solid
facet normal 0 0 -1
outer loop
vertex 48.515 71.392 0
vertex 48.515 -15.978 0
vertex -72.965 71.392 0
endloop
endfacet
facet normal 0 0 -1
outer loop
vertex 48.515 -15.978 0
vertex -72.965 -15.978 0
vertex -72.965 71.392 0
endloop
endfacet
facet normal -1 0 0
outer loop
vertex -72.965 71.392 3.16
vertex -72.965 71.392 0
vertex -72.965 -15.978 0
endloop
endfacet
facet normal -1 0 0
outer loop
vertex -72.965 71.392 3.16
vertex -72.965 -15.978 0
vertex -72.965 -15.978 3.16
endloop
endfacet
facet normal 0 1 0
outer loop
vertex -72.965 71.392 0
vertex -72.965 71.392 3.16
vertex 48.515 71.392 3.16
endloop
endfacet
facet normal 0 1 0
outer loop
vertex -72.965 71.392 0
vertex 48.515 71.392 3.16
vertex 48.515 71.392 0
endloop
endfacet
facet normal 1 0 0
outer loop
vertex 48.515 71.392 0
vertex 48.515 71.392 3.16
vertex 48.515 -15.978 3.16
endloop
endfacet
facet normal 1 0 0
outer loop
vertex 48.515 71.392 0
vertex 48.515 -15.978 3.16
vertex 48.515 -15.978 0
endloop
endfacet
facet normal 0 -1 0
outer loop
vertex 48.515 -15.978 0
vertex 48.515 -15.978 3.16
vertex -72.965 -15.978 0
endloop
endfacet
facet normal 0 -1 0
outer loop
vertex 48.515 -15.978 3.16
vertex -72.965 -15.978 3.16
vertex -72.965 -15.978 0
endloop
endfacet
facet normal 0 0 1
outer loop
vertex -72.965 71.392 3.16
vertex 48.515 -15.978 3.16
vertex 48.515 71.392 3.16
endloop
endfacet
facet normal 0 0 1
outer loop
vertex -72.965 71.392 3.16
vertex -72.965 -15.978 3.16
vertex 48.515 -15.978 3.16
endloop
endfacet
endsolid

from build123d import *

# Parameters (mm, degrees)
SKETCH2_W           = 77.34
SKETCH2_H           = 87.37
BOSS_EXTRUDE1_DEPTH = 3.16
SKETCH_3_W          = 3.16
SKETCH_3_H          = 87.37
EXTRUDE_3_DEPTH     = 80
SKETCH_4_W          = 3.16
SKETCH_4_H          = 87.37
EXTRUDE_4_DEPTH     = 60
SKETCH_5_W          = 3.16
SKETCH_5_H          = 87.37
EXTRUDE_5_DEPTH     = 113
SKETCH_6_W          = 3.16
SKETCH_6_H          = 87.37
CUT_EXTRUDE_1_DEPTH = 17.86
SKETCH_8_R          = 12.75
CUT_EXTRUDE_2_DEPTH = 10
SKETCH_9_W          = 3.16
SKETCH_9_H          = 87.37
CUT_EXTRUDE_3_DEPTH = 171
SKETCH_10_W         = 3.16
SKETCH_10_H         = 87.37
CUT_EXTRUDE_4_DEPTH = 60
SKETCH_1_W          = 3.16
SKETCH_1_H          = 87.37
EXTRUDE_6_DEPTH     = 20
SKETCH_11_W         = 3.16
SKETCH_11_H         = 87.37
EXTRUDE_7_DEPTH     = 20


with BuildPart() as part:
    # Sketch2 → Boss-Extrude1 (new body)
    with BuildSketch(Plane.XY):
        with Locations((-14.294928595, 27.706753385)):
            Rectangle(SKETCH2_W, SKETCH2_H)
    extrude(amount=BOSS_EXTRUDE1_DEPTH)

    # 草图3 → 凸台-拉伸3 (add)
    with BuildSketch(Plane(origin=(24.375071405, 0, 0), x_dir=(0, 0, -1), z_dir=(1, 0, 0))):
        with Locations((-1.58, 27.706753385)):
            Rectangle(SKETCH_3_W, SKETCH_3_H)
    extrude(amount=EXTRUDE_3_DEPTH)

    # 草图4 → 凸台-拉伸4 (add)
    with BuildSketch(Plane.ZY.offset(52.964928595)):
        with Locations((1.58, 27.706753385)):
            Rectangle(SKETCH_4_W, SKETCH_4_H)
    extrude(amount=EXTRUDE_4_DEPTH)

    # 草图5 → 凸台-拉伸5 (add)
    with BuildSketch(Plane(origin=(104.375071405, 0, 0), x_dir=(0, 0, -1), z_dir=(1, 0, 0))):
        with Locations((-1.58, 27.706753385)):
            Rectangle(SKETCH_5_W, SKETCH_5_H)
    extrude(amount=EXTRUDE_5_DEPTH)

    # 草图6 → 切除-拉伸1 (cut)
    with BuildSketch(Plane(origin=(217.375071405, 0, 0), x_dir=(0, 0, -1), z_dir=(1, 0, 0))):
        with Locations((-1.58, 27.706753385)):
            Rectangle(SKETCH_6_W, SKETCH_6_H)
    extrude(amount=-CUT_EXTRUDE_1_DEPTH, mode=Mode.SUBTRACT)

    # 草图8 → 切除-拉伸2 (cut)
    with BuildSketch(Plane.XY.offset(3.16)):
        with Locations((175.79355983, 23.47529756)):
            Circle(SKETCH_8_R)
    extrude(amount=-CUT_EXTRUDE_2_DEPTH, mode=Mode.SUBTRACT)

    # 草图9 → 切除-拉伸3 (cut)
    with BuildSketch(Plane(origin=(199.515071405, 0, 0), x_dir=(0, 0, -1), z_dir=(1, 0, 0))):
        with Locations((-1.58, 27.706753385)):
            Rectangle(SKETCH_9_W, SKETCH_9_H)
    extrude(amount=-CUT_EXTRUDE_3_DEPTH, mode=Mode.SUBTRACT)

    # 草图10 → 切除-拉伸4 (cut)
    with BuildSketch(Plane.ZY.offset(112.964928595)):
        with Locations((1.58, 27.706753385)):
            Rectangle(SKETCH_10_W, SKETCH_10_H)
    extrude(amount=-CUT_EXTRUDE_4_DEPTH, mode=Mode.SUBTRACT)

    # 草图1 → 凸台-拉伸6 (add)
    with BuildSketch(Plane.ZY.offset(52.964928595)):
        with Locations((1.58, 27.706753385)):
            Rectangle(SKETCH_1_W, SKETCH_1_H)
    extrude(amount=EXTRUDE_6_DEPTH)

    # 草图11 → 凸台-拉伸7 (add)
    with BuildSketch(Plane(origin=(28.515071405, 0, 0), x_dir=(0, 0, -1), z_dir=(1, 0, 0))):
        with Locations((-1.58, 27.706753385)):
            Rectangle(SKETCH_11_W, SKETCH_11_H)
    extrude(amount=EXTRUDE_7_DEPTH)


solid = part.part
